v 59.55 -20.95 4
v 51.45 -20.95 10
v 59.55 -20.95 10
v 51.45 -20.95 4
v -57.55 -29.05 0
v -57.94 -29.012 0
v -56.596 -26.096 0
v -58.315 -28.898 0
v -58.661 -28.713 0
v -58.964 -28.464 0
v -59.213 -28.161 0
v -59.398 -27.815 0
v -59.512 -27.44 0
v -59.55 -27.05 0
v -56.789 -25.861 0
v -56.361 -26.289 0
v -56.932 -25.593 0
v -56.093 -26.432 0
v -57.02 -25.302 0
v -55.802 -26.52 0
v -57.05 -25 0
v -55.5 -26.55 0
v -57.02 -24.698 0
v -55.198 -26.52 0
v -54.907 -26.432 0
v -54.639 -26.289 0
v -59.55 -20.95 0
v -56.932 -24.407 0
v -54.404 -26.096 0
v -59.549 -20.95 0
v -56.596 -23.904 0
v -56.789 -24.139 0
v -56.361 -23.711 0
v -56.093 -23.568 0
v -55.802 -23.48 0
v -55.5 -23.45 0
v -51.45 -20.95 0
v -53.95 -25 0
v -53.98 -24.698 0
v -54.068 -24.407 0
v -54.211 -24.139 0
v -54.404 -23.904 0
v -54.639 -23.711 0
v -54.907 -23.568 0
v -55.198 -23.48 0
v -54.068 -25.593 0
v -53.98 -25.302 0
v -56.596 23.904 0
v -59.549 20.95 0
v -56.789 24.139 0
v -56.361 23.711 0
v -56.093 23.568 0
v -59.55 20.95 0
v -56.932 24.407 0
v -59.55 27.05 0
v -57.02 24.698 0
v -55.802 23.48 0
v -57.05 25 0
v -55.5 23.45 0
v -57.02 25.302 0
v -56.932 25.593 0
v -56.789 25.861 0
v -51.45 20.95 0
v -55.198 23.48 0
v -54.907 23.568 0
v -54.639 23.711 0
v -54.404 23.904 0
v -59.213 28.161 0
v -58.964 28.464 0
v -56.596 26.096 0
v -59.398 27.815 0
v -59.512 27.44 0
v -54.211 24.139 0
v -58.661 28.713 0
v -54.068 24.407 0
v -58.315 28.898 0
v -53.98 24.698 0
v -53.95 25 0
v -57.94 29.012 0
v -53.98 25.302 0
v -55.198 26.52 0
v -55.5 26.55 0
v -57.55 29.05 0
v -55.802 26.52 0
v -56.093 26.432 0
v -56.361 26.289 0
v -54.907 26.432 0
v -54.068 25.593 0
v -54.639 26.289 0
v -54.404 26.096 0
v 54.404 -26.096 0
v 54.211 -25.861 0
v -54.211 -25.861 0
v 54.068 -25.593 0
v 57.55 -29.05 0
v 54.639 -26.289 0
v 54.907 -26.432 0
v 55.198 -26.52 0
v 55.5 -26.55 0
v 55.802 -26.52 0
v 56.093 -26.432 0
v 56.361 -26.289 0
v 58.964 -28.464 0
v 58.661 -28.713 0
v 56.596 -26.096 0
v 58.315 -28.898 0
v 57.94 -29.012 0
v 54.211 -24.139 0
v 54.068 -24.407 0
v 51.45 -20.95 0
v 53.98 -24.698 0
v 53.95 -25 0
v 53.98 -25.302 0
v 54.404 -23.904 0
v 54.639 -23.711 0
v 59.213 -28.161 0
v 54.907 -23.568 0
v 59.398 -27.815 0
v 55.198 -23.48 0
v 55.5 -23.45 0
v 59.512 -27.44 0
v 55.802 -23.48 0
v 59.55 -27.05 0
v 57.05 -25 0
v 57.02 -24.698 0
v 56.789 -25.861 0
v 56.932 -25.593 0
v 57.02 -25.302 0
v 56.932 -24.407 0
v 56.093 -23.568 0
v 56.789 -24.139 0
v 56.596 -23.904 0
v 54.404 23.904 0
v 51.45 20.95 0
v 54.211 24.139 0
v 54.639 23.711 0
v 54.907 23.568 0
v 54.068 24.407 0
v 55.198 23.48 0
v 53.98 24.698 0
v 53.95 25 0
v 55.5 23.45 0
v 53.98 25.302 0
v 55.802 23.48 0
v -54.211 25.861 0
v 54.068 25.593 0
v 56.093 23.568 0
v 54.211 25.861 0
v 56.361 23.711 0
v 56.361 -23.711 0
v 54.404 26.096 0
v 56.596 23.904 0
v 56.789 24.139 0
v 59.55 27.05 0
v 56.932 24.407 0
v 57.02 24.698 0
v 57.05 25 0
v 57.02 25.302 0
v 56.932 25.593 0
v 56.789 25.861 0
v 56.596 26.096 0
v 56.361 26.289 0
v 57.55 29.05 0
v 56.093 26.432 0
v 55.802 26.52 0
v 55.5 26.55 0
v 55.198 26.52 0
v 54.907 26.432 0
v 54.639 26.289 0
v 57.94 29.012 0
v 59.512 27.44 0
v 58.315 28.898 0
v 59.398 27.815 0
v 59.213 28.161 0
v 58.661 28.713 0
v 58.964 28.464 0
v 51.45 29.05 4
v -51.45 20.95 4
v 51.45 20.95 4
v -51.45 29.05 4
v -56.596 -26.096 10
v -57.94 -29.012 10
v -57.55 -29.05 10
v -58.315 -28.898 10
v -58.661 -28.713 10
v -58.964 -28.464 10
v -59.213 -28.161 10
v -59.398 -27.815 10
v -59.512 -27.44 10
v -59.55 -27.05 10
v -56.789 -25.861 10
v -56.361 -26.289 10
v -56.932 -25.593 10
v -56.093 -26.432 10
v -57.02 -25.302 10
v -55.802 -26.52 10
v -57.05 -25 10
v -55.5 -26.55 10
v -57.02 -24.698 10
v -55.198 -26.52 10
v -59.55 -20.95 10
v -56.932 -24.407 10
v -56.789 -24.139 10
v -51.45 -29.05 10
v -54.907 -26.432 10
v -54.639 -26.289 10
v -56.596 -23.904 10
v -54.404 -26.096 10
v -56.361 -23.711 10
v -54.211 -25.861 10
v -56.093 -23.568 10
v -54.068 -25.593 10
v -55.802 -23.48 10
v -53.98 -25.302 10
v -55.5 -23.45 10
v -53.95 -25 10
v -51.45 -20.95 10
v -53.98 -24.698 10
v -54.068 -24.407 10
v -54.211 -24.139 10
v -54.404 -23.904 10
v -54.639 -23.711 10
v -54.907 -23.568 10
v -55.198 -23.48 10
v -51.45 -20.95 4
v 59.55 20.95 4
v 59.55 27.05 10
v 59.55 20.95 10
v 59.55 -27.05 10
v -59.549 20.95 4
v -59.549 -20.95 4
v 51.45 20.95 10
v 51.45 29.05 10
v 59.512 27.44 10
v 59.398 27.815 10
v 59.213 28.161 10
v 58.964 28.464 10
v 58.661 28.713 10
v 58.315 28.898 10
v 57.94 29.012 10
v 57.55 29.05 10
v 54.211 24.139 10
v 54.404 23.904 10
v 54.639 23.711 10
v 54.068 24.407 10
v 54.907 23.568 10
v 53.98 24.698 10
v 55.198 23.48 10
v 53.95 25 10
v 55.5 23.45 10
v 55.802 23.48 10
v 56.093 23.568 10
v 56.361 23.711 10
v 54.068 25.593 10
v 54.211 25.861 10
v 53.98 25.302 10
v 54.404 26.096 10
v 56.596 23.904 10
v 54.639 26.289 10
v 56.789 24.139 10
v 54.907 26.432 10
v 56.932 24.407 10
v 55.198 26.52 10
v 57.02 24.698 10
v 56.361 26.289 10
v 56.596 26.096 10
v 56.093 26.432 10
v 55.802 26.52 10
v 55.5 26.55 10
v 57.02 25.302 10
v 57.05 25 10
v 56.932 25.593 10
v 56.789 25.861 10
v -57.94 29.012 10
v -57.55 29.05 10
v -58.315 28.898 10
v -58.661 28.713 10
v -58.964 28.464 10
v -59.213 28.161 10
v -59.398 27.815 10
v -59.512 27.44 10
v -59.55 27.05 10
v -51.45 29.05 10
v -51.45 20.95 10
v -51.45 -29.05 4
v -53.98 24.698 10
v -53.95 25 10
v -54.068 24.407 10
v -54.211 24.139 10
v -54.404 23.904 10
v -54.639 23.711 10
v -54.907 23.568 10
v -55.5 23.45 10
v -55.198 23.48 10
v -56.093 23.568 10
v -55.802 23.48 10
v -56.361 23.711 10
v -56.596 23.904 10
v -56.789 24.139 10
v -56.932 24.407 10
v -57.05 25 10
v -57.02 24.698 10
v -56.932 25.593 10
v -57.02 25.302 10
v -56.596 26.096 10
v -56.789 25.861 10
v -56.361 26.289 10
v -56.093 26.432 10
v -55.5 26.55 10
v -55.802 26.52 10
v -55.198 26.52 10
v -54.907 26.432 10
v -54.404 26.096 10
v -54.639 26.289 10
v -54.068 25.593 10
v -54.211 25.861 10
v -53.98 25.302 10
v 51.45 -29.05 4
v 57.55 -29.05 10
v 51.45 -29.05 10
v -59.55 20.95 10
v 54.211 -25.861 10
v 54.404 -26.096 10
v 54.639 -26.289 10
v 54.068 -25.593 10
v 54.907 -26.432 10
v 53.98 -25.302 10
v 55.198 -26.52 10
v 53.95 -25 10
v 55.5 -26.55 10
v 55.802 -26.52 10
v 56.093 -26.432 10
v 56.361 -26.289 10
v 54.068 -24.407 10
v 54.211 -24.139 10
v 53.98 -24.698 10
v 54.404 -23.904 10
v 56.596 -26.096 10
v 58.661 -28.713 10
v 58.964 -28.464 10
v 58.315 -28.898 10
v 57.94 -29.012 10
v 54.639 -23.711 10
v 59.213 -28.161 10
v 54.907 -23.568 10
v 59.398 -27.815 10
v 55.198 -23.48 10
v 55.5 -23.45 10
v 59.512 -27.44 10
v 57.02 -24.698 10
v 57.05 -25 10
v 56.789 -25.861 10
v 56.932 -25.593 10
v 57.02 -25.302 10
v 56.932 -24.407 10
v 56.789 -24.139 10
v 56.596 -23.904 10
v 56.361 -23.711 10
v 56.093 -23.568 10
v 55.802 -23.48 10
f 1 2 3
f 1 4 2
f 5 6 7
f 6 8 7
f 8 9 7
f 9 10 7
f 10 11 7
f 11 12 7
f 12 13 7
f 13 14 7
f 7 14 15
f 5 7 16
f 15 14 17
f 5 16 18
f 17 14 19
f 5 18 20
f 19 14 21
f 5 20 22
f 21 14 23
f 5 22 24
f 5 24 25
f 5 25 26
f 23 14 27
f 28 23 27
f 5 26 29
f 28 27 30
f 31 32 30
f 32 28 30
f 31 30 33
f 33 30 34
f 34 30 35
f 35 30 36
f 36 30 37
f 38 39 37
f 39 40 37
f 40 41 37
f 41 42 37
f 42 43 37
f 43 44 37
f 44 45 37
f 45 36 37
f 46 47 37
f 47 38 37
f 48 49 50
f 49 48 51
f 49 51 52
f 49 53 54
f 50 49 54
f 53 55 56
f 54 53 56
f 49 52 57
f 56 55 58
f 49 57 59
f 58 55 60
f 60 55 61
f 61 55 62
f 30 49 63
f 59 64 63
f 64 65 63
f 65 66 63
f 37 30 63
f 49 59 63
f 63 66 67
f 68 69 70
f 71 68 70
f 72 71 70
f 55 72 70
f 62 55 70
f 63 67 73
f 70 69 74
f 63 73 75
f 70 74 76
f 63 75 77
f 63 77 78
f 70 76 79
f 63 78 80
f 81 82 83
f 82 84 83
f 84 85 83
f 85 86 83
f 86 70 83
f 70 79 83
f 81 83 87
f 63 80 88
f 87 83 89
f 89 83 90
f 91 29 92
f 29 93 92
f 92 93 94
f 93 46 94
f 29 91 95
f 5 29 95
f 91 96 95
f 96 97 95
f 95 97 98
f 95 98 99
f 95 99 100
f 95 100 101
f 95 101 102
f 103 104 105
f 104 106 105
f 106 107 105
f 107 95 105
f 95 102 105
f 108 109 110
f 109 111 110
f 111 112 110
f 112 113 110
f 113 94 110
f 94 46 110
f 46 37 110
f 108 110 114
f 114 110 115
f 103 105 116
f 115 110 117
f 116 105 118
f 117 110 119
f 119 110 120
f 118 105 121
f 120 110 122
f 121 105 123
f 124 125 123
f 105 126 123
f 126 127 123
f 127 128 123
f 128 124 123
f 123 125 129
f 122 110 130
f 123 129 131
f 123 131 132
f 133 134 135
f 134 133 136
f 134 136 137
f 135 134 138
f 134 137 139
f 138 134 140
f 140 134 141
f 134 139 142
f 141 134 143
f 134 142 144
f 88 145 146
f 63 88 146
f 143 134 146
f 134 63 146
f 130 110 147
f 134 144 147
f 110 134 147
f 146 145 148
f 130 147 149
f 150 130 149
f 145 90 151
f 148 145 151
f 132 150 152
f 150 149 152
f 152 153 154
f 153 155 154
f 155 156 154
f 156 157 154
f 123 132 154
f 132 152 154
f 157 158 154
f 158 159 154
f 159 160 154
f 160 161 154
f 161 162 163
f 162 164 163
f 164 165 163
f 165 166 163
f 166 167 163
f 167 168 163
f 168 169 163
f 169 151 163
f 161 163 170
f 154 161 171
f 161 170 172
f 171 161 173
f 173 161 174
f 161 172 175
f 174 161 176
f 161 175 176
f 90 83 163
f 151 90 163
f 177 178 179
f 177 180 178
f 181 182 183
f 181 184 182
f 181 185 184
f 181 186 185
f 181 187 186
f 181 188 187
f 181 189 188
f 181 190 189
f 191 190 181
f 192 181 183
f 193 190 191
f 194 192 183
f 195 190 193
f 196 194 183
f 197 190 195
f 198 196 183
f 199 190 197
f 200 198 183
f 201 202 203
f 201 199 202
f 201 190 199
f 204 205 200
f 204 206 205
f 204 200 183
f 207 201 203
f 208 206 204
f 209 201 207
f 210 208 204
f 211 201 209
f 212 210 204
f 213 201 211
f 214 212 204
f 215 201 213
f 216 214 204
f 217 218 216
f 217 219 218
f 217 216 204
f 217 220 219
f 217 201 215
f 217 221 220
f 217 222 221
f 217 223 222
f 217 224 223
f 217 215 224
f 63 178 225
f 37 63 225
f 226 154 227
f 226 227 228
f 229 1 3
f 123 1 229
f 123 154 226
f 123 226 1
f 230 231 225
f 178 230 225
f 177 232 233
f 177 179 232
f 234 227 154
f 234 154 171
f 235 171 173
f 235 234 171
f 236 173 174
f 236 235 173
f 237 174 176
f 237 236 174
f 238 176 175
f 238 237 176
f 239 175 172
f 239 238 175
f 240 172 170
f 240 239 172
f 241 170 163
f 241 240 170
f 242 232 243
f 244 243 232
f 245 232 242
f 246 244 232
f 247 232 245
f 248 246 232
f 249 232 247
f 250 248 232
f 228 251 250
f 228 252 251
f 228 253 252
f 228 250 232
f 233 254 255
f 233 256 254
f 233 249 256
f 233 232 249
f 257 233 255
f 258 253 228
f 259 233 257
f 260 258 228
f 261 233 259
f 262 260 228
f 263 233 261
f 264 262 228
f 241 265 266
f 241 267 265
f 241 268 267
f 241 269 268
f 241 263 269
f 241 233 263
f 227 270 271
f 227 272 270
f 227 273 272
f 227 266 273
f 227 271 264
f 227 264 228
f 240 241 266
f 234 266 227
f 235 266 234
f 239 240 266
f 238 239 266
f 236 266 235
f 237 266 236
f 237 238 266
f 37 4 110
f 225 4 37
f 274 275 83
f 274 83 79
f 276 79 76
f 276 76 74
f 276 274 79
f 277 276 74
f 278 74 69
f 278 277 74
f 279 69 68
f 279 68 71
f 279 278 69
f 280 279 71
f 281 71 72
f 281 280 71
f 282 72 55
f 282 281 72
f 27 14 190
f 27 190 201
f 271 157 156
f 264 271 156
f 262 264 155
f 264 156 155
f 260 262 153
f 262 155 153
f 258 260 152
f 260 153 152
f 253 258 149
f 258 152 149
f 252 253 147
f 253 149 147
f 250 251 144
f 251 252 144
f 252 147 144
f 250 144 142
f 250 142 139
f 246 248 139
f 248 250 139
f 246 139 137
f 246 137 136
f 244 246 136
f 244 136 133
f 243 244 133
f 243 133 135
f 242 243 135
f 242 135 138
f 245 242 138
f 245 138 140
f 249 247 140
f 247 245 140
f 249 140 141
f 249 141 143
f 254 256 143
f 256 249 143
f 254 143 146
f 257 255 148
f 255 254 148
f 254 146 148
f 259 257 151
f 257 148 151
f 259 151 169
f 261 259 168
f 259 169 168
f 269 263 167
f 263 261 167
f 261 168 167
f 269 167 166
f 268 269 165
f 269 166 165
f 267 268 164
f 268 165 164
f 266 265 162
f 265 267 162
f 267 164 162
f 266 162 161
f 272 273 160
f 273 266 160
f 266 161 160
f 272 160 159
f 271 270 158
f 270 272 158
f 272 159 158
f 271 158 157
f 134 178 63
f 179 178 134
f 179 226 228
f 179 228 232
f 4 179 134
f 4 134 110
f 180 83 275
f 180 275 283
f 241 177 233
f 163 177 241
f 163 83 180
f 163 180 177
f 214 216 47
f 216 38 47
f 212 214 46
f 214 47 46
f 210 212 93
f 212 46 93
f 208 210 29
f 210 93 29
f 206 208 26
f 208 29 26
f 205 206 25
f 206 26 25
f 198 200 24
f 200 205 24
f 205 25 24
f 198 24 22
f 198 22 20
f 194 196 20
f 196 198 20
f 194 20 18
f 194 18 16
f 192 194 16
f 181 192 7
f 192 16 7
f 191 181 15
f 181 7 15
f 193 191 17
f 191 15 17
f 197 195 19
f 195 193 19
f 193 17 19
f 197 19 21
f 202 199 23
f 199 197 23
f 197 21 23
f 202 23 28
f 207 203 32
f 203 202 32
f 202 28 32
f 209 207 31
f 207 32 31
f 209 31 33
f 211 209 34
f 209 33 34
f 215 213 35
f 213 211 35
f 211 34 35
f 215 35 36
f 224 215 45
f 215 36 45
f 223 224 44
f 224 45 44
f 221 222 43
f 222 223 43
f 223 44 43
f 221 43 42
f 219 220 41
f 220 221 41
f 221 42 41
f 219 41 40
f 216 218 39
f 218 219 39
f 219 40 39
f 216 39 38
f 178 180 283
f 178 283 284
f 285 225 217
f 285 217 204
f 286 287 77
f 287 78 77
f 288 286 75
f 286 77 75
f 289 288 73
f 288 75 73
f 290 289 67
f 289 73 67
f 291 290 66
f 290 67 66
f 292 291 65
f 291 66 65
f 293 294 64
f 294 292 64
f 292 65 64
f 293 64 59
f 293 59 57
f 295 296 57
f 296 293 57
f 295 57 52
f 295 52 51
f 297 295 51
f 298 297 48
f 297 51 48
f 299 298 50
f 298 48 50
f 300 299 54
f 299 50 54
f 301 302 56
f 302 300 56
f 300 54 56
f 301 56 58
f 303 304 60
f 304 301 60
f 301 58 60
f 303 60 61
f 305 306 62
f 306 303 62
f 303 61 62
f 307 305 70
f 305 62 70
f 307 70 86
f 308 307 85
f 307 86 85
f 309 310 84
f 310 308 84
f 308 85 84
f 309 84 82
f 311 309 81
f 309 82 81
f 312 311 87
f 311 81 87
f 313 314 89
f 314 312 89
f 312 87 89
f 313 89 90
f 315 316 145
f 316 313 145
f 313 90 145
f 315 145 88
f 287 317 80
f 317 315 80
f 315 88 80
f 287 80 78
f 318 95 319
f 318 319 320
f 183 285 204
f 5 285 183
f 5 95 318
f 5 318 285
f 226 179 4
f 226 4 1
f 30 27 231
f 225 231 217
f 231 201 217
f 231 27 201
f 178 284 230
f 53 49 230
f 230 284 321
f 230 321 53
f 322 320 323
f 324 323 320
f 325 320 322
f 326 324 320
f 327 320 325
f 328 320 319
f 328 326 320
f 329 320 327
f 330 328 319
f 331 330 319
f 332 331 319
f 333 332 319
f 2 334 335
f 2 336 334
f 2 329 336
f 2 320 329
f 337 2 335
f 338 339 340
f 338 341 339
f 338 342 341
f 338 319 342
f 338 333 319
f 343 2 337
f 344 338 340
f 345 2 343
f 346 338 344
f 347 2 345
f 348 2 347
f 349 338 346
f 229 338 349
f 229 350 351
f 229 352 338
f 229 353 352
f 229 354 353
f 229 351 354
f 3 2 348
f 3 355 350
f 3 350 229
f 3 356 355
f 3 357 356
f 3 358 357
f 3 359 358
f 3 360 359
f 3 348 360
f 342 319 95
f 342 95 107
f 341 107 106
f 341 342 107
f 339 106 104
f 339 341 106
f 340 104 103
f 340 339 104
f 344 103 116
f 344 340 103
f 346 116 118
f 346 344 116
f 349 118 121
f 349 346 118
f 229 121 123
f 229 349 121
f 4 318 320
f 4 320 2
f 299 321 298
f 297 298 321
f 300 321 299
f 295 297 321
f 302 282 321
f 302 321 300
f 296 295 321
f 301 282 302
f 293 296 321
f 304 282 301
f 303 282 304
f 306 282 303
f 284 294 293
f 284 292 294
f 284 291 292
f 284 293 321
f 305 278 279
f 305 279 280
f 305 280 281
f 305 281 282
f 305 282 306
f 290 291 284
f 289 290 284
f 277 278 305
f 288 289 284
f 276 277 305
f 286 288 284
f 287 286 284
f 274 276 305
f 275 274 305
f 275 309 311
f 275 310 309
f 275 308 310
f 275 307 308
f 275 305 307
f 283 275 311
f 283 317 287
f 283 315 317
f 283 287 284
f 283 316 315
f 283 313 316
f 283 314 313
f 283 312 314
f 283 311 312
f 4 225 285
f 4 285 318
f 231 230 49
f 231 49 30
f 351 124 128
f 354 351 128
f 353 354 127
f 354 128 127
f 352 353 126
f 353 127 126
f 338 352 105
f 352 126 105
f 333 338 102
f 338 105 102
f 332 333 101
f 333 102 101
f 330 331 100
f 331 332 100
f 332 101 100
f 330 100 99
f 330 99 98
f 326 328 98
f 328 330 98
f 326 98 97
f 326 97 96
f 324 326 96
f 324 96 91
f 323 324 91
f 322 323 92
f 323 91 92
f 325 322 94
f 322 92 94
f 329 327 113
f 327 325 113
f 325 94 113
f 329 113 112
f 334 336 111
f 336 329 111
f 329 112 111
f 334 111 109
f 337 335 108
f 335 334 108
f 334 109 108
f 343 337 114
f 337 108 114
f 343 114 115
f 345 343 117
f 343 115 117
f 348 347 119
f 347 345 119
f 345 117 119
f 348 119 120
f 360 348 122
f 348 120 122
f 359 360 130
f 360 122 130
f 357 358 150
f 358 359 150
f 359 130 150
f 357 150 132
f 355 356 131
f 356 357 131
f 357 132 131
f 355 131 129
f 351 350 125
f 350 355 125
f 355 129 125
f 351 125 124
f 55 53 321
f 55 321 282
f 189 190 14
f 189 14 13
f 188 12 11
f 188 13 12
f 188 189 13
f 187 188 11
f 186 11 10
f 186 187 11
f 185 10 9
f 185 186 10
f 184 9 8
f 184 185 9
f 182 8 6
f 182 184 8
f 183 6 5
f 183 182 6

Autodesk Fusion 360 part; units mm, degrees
sketch "Base and Mounts" plane through (0, 0, 0) normal (0, 0, 1) x (1, 0, 0)
  line L0 (-55.5, 25) -> (55.5, 25) construction
  line L1 (55.5, 25) -> (55.5, -25) construction
  line L2 (55.5, -25) -> (-55.5, -25) construction
  line L3 (-55.5, -25) -> (-55.5, 25) construction
  line L4 (-55.5, 25) -> (55.5, -25) construction
  line L5 (55.5, 25) -> (-55.5, -25) construction
  circle A0 centre (-55.5, 25) radius 1.55
  circle A1 centre (55.5, 25) radius 1.55
  circle A2 centre (-55.5, -25) radius 1.55
  circle A3 centre (55.5, -25) radius 1.55
  line L6 (-59.55, 29.05) -> (-51.45, 29.05)
  line L7 (-51.45, 29.05) -> (-51.45, 20.95)
  line L8 (-51.45, 20.95) -> (-59.55, 20.95)
  line L9 (-59.55, 20.95) -> (-59.55, 29.05)
  line L10 (-59.55, 29.05) -> (-51.45, 20.95) construction
  line L11 (-51.45, 29.05) -> (-59.55, 20.95) construction
  line L12 (51.45, 29.05) -> (59.55, 29.05)
  line L13 (59.55, 29.05) -> (59.55, 20.95)
  line L14 (59.55, 20.95) -> (51.45, 20.95)
  line L15 (51.45, 20.95) -> (51.45, 29.05)
  line L16 (51.45, 29.05) -> (59.55, 20.95) construction
  line L17 (59.55, 29.05) -> (51.45, 20.95) construction
  line L18 (51.45, -20.95) -> (59.55, -20.95)
  line L19 (59.55, -20.95) -> (59.55, -29.05)
  line L20 (59.55, -29.05) -> (51.45, -29.05)
  line L21 (51.45, -29.05) -> (51.45, -20.95)
  line L22 (51.45, -20.95) -> (59.55, -29.05) construction
  line L23 (59.55, -20.95) -> (51.45, -29.05) construction
  line L24 (-59.55, -20.95) -> (-51.45, -20.95)
  line L25 (-51.45, -20.95) -> (-51.45, -29.05)
  line L26 (-51.45, -29.05) -> (-59.55, -29.05)
  line L27 (-59.55, -29.05) -> (-59.55, -20.95)
  line L28 (-59.55, -20.95) -> (-51.45, -29.05) construction
  line L29 (-51.45, -20.95) -> (-59.55, -29.05) construction
  line L30 (-51.45, 29.05) -> (51.45, 29.05)
  line L31 (59.55, 20.95) -> (59.55, -20.95)
  line L32 (51.45, -29.05) -> (-51.45, -29.05)
  line L33 (-59.55, -20.95) -> (-59.55, 20.95)
  point P0 (-55.5, 25)
  point P1 (55.5, 25)
  point P2 (55.5, -25)
  point P3 (-55.5, -25)
  dimension "d6" = 111
  dimension "d7" = 50
  dimension "d8" = 3.1
  dimension "d9" = 3.1
  dimension "d10" = 3.1
  dimension "d11" = 3.1
  dimension "d12" = 4.05
  dimension "d13" = 4.05
  dimension "d14" = 4.05
  dimension "d15" = 4.05
  dimension "d16" = 4.05
  dimension "d17" = 4.05
  dimension "d18" = 4.05
  dimension "d19" = 4.05
  dimension "d25" = 4.05
extrude "Extrude1" add sketch "Base and Mounts" along normal blind 10 contours L6 L7 L8 L9 | L12 L13 L14 L15 | L24 L25 L26 L27 | L18 L19 L20 L21 makes body 1 at (56.7356, 25.9359, 6.6667) makes body 2 at (55.4614, -23.4505, 6.6667) makes body 3 at (-55.5386, 26.5495, 6.6667) makes body 4 at (-54.2644, -24.0641, 6.6667)
extrude "Extrude2" add sketch "Base and Mounts" along normal blind 4 contours L7 L8 L14 L15 L18 L21 L24 L25 L30 L31 L32 L33 bodies 1 2 3 4
sketch "Cutouts" plane through (0, 0, 4) normal (0, 0, 1) x (-1, 0, 0)
  line L0 (51.45, 20.95) -> (51.45, 29.05)
  line L1 (51.45, 29.05) -> (-51.45, 29.05)
  line L2 (-51.45, 29.05) -> (-51.45, 20.95)
  line L3 (-51.45, 20.95) -> (-59.55, 20.95)
  line L4 (-59.55, 20.95) -> (-59.55, -20.95)
  line L5 (-59.55, -20.95) -> (-51.45, -20.95)
  line L6 (-51.45, -20.95) -> (-51.45, -29.05)
  line L7 (-51.45, -29.05) -> (51.45, -29.05)
  line L8 (51.45, -29.05) -> (51.45, -20.95)
  line L9 (51.45, -20.95) -> (59.55, -20.95)
  line L10 (59.55, -20.95) -> (59.55, 20.95)
  line L11 (59.55, 20.95) -> (51.45, 20.95)
  line L12 (59.55, -20.95) -> (59.549, -20.95)
  line L13 (59.549, -20.95) -> (59.549, 20.95)
  line L14 (59.549, 20.95) -> (59.55, 20.95)
  line L15 (59.55, 20.95) -> (59.55, -20.95)
  line L16 (59.549, -20.95) -> (51.449, -20.95)
  line L17 (51.449, -20.95) -> (51.449, 20.95)
  line L18 (51.449, 20.95) -> (59.549, 20.95)
  line L19 (59.549, 20.95) -> (59.549, -20.95)
  line L20 (51.449, -20.95) -> (-51.45, -20.95)
  line L21 (-51.45, -20.95) -> (-51.45, 20.95)
  line L22 (-51.45, 20.95) -> (51.449, 20.95)
  line L23 (51.449, 20.95) -> (51.449, -20.95)
  point P0 (59.55, 20.95)
  dimension "d27" = 0.001
  dimension "d28" = 8.1
  dimension "d29" = 41.9
  dimension "d30" = 8.101
  dimension "d41" = 41.9
  dimension "d42" = 41.9
extrude "Extrude3" cut sketch "Cutouts" against normal up to surface (4 mm away) contours L17 L20 L21 L22 L23 bodies 1
extrude "Extrude4" cut sketch "Cutouts" against normal up to surface (4 mm away) contours L9 L10 L11 L12 L13 L14 L15 L19 bodies 1
fillet "Fillet5" radius 2 4 edges at (59.55, -29.05, 5) (-59.55, -29.05, 5) (-59.55, 29.05, 5) (59.55, 29.05, 5) on bodies 1
equation "HoleSpacingX = 50 mm"
equation "HoleSpacingY = 111 mm"
equation "ThreadedInsertDiameter = 3.1 mm"
equation "ThreadedInsertHeight = 4 mm"
equation "ThreadedInsertClearance = 2.5 mm"
equation "d6 = HoleSpacingY"
equation "d7 = HoleSpacingX"
equation "d8 = ThreadedInsertDiameter"
equation "d9 = ThreadedInsertDiameter"
equation "d10 = ThreadedInsertDiameter"
equation "d11 = ThreadedInsertDiameter"
equation "d12 = ThreadedInsertClearance + ( ThreadedInsertDiameter / 2 )"
equation "d13 = d12"
equation "d14 = d12"
equation "d15 = d12"
equation "d16 = d12"
equation "d17 = d12"
equation "d18 = d12"
equation "d19 = d12"
equation "MountHeight = 6 mm"
equation "d21 = MountHeight + ThreadedInsertHeight"
equation "d23 = ThreadedInsertHeight"
equation "d25 = d12"
equation "DebugHeaderCutoutWidth = 0.001 mm"
equation "d27 = DebugHeaderCutoutWidth"
equation "d28 = 2 * d12"
equation "d29 = d42"
equation "d41 = d42"
